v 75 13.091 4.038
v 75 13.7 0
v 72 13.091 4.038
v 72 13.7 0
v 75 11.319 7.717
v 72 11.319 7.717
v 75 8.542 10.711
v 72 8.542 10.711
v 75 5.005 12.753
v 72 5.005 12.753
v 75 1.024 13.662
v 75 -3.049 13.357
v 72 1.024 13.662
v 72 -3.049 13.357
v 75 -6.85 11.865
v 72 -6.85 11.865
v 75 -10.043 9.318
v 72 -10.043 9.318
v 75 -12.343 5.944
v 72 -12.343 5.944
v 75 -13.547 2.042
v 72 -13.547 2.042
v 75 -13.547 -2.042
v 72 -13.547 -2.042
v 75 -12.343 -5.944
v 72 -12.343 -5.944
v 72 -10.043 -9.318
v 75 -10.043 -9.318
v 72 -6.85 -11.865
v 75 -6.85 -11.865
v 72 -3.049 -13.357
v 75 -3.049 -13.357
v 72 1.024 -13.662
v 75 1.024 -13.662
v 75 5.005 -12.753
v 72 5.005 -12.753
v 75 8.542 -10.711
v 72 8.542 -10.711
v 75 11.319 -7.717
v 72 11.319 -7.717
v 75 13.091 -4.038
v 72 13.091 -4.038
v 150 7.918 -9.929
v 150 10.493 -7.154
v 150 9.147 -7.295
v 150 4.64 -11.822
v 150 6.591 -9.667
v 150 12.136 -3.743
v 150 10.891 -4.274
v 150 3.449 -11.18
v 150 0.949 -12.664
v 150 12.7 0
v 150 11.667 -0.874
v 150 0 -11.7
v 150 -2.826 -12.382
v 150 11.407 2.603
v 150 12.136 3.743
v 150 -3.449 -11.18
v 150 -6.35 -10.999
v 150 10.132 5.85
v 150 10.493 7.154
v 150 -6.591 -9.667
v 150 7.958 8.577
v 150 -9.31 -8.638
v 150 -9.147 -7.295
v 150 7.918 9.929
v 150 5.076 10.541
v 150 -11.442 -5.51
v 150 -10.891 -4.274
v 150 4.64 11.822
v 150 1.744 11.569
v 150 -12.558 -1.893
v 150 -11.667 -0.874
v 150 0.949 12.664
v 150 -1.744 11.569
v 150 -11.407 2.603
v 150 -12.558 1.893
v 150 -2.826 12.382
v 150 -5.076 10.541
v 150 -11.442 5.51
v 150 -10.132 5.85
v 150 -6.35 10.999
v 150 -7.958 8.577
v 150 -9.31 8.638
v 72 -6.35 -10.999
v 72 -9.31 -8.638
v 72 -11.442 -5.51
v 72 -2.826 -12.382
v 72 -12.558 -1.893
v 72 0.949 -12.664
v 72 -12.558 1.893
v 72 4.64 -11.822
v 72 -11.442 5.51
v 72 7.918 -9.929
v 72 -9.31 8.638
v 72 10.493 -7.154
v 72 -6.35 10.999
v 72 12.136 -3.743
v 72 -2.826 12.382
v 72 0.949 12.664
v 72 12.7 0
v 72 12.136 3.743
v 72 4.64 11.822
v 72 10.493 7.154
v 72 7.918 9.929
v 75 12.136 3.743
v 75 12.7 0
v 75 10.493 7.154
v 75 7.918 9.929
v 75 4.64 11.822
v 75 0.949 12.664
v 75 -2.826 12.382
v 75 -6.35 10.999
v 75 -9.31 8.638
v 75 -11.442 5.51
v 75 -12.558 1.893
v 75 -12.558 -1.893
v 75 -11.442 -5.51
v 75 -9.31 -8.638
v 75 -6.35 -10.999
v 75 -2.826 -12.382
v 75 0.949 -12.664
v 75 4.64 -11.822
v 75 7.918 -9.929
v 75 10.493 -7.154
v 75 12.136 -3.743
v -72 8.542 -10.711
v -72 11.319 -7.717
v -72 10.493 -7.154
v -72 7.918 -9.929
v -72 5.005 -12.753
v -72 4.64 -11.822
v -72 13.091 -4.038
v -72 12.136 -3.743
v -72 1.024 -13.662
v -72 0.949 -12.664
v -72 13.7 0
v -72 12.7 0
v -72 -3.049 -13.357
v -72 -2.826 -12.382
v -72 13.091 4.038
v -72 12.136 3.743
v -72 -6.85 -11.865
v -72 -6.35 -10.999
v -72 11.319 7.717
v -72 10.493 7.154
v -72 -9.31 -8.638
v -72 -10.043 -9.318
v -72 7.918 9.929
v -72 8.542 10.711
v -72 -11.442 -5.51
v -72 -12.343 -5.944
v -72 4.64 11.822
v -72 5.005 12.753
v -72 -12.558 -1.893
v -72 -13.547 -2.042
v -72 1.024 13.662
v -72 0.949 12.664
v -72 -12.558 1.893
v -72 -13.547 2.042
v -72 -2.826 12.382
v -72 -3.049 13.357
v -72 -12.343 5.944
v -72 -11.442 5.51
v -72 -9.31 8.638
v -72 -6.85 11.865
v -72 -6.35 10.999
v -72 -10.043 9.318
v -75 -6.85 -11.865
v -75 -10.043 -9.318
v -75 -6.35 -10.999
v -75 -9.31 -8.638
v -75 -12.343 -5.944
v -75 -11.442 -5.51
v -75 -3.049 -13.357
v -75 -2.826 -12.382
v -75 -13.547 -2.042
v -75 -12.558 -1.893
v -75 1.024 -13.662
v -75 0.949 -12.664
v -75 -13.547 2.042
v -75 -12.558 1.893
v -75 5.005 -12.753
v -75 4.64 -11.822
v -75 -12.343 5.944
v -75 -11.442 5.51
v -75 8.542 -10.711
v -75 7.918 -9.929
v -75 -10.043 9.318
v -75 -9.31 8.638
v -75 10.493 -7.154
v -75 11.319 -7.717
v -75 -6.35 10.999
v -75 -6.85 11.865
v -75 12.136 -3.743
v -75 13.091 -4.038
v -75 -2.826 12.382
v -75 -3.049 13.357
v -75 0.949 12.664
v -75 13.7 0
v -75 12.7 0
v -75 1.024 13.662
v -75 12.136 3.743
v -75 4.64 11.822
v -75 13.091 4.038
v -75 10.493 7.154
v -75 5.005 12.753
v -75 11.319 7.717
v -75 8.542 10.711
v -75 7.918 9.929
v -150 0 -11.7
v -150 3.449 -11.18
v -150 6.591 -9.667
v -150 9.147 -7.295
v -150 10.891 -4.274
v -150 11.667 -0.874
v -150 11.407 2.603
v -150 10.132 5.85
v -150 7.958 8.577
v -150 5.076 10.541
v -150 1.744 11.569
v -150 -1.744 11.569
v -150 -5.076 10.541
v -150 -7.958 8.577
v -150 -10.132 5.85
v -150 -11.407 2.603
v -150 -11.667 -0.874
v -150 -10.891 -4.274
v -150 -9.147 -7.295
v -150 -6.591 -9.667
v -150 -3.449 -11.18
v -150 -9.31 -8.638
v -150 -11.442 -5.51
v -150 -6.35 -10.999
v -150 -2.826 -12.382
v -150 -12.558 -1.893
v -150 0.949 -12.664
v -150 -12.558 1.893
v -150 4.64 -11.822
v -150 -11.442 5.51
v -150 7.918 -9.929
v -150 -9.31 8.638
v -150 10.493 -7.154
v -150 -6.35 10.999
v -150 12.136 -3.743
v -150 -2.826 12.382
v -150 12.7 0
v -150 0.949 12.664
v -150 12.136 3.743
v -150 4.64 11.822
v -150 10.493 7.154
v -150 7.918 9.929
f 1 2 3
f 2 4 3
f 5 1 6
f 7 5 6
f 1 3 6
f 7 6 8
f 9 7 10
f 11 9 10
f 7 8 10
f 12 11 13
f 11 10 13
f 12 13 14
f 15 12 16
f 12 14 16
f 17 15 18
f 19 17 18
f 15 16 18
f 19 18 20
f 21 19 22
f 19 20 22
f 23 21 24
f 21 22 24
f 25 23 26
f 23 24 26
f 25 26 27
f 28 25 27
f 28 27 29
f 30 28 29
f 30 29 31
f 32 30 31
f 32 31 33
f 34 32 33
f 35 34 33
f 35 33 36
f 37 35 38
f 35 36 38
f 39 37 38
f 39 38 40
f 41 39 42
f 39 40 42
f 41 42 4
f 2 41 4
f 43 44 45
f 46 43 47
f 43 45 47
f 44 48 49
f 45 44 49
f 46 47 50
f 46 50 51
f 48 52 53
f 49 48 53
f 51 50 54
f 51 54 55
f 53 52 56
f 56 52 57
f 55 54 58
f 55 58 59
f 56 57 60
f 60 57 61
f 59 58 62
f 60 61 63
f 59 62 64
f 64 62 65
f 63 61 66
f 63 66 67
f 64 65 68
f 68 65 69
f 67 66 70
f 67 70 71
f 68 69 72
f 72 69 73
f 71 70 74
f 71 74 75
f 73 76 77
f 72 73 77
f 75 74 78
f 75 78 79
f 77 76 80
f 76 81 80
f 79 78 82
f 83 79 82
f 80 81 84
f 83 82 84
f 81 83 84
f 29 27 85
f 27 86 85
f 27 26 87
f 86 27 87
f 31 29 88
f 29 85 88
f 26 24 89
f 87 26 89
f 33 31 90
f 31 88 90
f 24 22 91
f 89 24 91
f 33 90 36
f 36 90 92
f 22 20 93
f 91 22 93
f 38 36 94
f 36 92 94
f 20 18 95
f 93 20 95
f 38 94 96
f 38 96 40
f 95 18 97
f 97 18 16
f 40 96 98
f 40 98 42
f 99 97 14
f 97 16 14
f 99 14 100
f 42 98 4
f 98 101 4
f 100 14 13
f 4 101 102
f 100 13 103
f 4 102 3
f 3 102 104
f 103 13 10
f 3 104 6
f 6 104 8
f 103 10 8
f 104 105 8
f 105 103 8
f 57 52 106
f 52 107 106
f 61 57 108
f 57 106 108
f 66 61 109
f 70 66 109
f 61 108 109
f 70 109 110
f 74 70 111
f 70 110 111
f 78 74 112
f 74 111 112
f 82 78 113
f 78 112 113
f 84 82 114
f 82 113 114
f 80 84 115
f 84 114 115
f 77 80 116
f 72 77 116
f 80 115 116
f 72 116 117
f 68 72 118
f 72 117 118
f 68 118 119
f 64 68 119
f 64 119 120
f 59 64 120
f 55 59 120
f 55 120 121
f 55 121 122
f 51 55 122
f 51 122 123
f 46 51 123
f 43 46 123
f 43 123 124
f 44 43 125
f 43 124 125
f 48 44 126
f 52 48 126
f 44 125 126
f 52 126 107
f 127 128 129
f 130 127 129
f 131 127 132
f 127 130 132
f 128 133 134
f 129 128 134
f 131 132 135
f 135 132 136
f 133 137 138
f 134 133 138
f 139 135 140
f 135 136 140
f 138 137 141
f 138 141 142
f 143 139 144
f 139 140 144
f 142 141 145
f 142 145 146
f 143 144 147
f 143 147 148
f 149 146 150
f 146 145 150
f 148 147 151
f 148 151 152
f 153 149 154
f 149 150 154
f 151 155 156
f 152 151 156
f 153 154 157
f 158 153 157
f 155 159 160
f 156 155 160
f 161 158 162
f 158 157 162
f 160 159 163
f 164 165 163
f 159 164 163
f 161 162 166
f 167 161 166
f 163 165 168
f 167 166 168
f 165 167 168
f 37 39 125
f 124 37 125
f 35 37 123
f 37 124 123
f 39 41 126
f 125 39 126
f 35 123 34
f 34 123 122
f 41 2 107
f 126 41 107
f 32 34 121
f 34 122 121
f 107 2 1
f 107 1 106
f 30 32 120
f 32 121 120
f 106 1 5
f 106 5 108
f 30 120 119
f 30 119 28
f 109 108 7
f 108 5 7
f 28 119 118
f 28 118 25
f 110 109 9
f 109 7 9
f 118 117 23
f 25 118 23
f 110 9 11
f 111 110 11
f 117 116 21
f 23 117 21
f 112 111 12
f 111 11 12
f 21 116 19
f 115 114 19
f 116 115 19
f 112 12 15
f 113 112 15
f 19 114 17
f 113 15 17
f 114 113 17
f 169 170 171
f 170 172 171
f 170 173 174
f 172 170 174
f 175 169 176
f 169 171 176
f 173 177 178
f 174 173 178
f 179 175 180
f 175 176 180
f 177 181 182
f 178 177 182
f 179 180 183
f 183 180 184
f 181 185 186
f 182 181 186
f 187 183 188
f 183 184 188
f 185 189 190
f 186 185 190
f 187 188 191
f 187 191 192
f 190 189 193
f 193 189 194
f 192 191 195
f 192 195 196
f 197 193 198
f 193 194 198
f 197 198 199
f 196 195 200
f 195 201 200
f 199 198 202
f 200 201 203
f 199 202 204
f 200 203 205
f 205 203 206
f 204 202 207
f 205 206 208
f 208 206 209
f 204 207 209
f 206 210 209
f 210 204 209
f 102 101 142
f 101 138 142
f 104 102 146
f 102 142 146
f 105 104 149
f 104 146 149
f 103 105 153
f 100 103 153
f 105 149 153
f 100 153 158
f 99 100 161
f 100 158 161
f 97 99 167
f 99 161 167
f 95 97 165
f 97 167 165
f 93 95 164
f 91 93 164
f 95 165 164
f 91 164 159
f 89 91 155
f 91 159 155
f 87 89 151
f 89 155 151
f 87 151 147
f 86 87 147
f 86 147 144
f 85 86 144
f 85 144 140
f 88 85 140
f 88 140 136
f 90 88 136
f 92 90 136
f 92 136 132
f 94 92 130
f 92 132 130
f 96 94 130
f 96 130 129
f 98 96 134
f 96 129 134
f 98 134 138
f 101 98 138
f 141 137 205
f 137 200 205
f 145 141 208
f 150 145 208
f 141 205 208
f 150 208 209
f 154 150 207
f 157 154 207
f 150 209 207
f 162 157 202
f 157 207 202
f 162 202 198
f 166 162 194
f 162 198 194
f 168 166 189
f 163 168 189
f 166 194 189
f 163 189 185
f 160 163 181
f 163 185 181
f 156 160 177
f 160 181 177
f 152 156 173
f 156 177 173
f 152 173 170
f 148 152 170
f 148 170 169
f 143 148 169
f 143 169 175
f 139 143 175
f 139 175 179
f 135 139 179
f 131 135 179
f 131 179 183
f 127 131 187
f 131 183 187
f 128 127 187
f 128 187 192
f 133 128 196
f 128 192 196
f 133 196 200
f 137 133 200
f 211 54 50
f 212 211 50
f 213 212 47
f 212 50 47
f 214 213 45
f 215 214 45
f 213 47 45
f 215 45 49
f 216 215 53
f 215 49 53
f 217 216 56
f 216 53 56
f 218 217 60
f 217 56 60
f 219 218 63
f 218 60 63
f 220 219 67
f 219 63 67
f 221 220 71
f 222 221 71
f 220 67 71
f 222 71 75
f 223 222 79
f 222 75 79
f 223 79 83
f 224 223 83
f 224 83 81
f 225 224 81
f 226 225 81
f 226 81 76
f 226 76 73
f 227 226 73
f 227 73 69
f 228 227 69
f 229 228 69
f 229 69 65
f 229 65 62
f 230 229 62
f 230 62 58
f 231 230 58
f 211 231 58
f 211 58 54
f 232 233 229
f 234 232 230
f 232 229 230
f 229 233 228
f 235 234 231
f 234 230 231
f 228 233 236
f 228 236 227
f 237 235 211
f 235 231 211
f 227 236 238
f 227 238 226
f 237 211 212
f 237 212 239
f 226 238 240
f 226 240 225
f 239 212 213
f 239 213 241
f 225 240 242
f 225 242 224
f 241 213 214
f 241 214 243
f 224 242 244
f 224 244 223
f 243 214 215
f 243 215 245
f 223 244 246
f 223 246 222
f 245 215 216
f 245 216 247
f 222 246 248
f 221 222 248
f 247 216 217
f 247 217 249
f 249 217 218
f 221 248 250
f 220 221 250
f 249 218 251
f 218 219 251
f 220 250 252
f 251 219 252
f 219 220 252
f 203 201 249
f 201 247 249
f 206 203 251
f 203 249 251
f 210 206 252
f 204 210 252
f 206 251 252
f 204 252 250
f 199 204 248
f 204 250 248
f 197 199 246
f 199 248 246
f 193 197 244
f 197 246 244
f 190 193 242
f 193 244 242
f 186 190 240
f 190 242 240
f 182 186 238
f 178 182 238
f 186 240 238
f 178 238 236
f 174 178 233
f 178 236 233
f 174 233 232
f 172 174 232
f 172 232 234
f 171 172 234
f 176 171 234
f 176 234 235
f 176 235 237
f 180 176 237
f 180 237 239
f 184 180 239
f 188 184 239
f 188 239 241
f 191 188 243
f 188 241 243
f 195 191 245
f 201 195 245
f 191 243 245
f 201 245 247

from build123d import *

# Parameters (mm, degrees)
SKETCH3_R               = 11.7
CUT_EXTRUDE1_DEPTH      = 1
CUT_EXTRUDE1_DEPTH_BACK = 301


with BuildPart() as part:
    # Sketch1 → Revolve1 (revolve)
    with BuildSketch(Plane.XY):
        Polygon((-150, 0), (150, 0), (150, 12.7), (75, 12.7), (75, 13.7), (72, 13.7), (72, 12.7), (-72, 12.7), (-72, 13.7), (-75, 13.7), (-75, 12.7), (-150, 12.7), align=None)
    revolve(axis=Axis((-150, 0, 0), (1, 0, 0)))

    # Sketch3 → Cut-Extrude1 (cut, two sides)
    with BuildSketch(Plane(origin=(150, 0, 0), x_dir=(0, 0, -1), z_dir=(1, 0, 0))) as cut_extrude1_sk:
        Circle(SKETCH3_R)
    extrude(amount=CUT_EXTRUDE1_DEPTH, mode=Mode.SUBTRACT)
    extrude(cut_extrude1_sk.sketch, amount=-CUT_EXTRUDE1_DEPTH_BACK, mode=Mode.SUBTRACT)


solid = part.part
